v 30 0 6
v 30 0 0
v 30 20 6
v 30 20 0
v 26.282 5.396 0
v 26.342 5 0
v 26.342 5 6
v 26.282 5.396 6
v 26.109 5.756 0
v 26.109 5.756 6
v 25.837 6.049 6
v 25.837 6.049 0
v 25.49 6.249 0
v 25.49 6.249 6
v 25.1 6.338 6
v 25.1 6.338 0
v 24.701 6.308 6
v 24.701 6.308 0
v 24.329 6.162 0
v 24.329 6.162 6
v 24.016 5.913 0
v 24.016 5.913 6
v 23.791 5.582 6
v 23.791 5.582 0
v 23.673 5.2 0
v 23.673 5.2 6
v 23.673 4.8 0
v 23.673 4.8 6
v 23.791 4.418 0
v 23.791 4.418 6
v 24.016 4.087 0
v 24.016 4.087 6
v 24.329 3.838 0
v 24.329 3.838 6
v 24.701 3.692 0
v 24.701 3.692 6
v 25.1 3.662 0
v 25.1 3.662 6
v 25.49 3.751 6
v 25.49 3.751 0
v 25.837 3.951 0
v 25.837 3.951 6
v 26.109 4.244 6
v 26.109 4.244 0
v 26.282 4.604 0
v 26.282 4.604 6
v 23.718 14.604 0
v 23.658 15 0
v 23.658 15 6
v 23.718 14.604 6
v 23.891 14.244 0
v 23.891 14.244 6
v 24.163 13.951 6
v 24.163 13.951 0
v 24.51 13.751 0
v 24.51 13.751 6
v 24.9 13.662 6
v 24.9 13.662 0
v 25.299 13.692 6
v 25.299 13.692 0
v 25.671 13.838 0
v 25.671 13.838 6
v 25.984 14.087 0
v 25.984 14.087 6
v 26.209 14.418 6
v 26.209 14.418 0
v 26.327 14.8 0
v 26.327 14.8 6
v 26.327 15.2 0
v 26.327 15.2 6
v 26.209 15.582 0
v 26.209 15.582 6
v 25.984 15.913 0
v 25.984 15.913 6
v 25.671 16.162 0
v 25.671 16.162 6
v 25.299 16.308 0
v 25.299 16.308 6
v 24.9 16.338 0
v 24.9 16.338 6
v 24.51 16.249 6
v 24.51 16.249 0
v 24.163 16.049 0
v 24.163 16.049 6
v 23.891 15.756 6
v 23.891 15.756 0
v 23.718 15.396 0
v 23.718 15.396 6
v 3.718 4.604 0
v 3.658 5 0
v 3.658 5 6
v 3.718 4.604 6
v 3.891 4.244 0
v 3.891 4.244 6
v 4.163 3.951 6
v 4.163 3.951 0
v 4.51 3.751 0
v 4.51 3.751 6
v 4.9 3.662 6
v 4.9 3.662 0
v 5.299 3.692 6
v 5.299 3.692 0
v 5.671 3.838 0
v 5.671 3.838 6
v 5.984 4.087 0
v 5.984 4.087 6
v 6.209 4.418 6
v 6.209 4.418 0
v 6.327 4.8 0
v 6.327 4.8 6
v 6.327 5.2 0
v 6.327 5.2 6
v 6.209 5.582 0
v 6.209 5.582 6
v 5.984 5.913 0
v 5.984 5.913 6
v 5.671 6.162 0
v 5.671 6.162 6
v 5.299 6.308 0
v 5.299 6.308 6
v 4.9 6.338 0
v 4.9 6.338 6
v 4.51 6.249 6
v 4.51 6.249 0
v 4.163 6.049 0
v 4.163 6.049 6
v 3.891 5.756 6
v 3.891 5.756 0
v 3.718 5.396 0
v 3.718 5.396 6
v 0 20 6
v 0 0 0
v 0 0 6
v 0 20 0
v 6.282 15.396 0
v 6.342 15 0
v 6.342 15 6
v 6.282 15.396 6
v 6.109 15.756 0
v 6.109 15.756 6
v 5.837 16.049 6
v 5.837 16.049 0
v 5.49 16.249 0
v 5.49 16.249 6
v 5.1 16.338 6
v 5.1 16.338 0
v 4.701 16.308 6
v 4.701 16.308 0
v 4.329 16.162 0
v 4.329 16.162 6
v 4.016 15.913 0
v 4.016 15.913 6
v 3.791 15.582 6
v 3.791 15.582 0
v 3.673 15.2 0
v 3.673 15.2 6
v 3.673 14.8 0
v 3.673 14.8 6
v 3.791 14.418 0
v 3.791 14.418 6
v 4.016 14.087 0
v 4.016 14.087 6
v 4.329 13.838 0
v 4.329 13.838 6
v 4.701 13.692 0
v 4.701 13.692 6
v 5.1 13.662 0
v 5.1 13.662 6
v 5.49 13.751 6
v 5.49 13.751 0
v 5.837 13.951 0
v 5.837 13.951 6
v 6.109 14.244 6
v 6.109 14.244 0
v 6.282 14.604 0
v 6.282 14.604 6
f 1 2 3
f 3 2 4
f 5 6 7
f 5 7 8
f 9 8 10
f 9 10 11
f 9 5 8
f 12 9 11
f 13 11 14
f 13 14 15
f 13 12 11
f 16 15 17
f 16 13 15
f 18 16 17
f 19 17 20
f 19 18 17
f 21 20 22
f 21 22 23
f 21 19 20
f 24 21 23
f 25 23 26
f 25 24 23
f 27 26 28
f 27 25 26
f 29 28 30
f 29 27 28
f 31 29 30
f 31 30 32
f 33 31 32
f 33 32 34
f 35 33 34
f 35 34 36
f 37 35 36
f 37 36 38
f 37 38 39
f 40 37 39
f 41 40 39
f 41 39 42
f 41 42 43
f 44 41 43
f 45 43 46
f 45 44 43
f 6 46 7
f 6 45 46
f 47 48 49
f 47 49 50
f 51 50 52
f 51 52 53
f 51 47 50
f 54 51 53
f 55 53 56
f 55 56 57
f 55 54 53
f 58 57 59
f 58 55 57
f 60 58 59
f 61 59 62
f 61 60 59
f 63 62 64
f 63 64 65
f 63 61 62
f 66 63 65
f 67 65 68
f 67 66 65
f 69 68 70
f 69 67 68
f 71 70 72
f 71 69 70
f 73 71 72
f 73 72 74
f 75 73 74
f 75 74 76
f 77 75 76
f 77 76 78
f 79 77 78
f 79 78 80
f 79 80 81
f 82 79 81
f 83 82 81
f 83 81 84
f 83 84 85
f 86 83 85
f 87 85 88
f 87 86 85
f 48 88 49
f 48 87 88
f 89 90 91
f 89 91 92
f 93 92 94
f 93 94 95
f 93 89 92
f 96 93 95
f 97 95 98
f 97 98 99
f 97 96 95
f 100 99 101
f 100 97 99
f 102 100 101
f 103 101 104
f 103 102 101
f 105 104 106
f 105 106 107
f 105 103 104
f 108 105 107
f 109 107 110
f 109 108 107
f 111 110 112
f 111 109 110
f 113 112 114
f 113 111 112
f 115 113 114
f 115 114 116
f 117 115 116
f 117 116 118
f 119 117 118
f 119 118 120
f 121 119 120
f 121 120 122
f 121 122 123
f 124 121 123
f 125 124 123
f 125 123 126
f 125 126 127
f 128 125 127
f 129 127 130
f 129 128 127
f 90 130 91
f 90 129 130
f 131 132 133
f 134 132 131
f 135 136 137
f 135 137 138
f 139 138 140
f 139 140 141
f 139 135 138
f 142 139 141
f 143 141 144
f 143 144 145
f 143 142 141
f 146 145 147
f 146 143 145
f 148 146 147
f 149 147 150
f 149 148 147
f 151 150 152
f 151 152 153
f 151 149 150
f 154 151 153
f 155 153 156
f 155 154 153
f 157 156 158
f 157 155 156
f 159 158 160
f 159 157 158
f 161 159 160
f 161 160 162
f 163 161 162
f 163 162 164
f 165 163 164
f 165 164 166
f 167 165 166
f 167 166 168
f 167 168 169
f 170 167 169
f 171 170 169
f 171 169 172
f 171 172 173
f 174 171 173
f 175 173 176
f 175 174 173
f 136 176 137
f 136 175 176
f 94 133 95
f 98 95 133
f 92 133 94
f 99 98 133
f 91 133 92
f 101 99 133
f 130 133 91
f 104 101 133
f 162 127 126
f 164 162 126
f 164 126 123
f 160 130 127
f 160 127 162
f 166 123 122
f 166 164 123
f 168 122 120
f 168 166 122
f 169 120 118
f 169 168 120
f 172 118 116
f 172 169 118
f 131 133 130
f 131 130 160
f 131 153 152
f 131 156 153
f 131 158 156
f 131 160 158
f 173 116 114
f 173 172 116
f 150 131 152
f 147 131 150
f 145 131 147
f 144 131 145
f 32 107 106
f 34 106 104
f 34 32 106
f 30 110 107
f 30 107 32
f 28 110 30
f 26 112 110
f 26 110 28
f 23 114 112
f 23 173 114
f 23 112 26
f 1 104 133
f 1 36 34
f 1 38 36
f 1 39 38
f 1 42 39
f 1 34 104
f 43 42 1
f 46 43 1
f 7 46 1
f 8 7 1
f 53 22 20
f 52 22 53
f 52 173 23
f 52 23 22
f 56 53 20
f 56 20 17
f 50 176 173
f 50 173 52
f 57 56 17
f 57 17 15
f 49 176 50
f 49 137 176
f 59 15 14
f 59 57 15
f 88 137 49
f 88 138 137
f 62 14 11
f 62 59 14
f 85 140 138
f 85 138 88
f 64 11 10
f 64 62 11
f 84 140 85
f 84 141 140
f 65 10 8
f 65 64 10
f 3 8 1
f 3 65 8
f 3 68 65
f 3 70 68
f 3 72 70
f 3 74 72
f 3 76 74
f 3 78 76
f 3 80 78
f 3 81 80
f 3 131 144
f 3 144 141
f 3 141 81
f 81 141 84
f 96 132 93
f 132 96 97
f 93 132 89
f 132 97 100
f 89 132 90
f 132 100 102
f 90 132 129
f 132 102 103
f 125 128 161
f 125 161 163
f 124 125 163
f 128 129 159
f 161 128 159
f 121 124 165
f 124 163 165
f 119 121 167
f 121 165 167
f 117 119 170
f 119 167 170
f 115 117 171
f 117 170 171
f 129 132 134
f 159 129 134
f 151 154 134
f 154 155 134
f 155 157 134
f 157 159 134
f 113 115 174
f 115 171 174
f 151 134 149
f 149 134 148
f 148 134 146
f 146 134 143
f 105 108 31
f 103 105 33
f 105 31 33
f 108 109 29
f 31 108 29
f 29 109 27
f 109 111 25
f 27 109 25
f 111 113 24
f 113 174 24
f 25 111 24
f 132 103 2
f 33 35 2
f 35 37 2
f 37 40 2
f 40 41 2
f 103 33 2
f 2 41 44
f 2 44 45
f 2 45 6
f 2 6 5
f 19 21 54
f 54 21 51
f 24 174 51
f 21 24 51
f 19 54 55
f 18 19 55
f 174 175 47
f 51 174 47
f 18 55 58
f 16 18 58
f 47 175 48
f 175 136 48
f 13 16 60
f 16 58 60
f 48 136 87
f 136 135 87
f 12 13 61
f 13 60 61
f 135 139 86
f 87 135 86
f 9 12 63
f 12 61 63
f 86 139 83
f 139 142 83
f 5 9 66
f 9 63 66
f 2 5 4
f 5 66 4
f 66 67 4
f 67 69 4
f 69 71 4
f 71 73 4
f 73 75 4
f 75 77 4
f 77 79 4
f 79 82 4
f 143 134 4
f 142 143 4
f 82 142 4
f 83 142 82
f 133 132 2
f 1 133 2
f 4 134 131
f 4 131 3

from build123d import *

# Parameters (mm, degrees)
ESQUISSE1_W        = 30
ESQUISSE1_H        = 20
ESQUISSE1_R        = 1.341808551
BOSS_EXTRU_1_DEPTH = 6


with BuildPart() as part:
    # Esquisse1 → Boss.-Extru.1 (new body)
    with BuildSketch(Plane.XY):
        with Locations((15, 10)):
            Rectangle(ESQUISSE1_W, ESQUISSE1_H)
        with Locations((5, 15)):
            Circle(ESQUISSE1_R, mode=Mode.SUBTRACT)
        with Locations(Location((25, 15, 0), (0, 0, 180))):
            Circle(ESQUISSE1_R, mode=Mode.SUBTRACT)
        with Locations((25, 5)):
            Circle(ESQUISSE1_R, mode=Mode.SUBTRACT)
        with Locations(Location((5, 5, 0), (0, 0, 180))):
            Circle(ESQUISSE1_R, mode=Mode.SUBTRACT)
    extrude(amount=BOSS_EXTRU_1_DEPTH)


solid = part.part
